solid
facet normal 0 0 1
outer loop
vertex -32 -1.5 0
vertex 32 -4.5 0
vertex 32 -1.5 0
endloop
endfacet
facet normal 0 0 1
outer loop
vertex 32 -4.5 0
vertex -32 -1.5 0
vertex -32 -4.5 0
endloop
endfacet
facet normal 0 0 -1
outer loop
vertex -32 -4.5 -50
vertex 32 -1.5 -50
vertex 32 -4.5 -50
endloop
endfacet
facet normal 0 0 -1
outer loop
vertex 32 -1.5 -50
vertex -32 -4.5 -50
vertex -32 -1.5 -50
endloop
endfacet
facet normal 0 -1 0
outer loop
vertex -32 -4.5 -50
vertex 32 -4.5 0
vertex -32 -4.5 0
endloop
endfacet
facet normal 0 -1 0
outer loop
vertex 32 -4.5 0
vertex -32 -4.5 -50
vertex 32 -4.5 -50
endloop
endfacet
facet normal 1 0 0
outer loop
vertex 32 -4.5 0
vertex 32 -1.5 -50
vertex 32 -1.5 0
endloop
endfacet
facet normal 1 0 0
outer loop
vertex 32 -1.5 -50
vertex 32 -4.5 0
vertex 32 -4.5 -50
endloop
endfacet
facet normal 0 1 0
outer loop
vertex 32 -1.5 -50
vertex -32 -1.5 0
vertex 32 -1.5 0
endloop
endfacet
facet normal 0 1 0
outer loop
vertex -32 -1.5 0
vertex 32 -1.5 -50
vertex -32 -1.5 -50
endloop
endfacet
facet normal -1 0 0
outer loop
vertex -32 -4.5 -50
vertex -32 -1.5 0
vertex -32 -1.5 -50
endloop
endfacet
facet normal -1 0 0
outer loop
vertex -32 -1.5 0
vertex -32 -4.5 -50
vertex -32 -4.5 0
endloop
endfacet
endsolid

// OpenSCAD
// file: ../config.scad
// all measures in millimeters

// rendering quality
$fn = 200;

// material to cut from
material_z = 3;

// wall configuration: bounding box measures
wall_x = 550;
wall_y = 150;
wall_z = 400;

wall_width = 30;
foot_z = 30;

// pots are hung at wall supports
support_count = 5;
support_z = 30;

// pot configuration: outer measures of the top opening
pot_x = 70;
pot_y = 70;
pot_z = 50;

// pots have hooks to hang at the wall supports
hook_width = 10;
// main file
include <../config.scad>;

module pot_back()
{
    translate([
        0,
        -material_z,
        -pot_z/2
        ])
    cube([
        pot_x - 2*material_z,
        material_z,
        pot_z
        ], center=true);
}

pot_back();
